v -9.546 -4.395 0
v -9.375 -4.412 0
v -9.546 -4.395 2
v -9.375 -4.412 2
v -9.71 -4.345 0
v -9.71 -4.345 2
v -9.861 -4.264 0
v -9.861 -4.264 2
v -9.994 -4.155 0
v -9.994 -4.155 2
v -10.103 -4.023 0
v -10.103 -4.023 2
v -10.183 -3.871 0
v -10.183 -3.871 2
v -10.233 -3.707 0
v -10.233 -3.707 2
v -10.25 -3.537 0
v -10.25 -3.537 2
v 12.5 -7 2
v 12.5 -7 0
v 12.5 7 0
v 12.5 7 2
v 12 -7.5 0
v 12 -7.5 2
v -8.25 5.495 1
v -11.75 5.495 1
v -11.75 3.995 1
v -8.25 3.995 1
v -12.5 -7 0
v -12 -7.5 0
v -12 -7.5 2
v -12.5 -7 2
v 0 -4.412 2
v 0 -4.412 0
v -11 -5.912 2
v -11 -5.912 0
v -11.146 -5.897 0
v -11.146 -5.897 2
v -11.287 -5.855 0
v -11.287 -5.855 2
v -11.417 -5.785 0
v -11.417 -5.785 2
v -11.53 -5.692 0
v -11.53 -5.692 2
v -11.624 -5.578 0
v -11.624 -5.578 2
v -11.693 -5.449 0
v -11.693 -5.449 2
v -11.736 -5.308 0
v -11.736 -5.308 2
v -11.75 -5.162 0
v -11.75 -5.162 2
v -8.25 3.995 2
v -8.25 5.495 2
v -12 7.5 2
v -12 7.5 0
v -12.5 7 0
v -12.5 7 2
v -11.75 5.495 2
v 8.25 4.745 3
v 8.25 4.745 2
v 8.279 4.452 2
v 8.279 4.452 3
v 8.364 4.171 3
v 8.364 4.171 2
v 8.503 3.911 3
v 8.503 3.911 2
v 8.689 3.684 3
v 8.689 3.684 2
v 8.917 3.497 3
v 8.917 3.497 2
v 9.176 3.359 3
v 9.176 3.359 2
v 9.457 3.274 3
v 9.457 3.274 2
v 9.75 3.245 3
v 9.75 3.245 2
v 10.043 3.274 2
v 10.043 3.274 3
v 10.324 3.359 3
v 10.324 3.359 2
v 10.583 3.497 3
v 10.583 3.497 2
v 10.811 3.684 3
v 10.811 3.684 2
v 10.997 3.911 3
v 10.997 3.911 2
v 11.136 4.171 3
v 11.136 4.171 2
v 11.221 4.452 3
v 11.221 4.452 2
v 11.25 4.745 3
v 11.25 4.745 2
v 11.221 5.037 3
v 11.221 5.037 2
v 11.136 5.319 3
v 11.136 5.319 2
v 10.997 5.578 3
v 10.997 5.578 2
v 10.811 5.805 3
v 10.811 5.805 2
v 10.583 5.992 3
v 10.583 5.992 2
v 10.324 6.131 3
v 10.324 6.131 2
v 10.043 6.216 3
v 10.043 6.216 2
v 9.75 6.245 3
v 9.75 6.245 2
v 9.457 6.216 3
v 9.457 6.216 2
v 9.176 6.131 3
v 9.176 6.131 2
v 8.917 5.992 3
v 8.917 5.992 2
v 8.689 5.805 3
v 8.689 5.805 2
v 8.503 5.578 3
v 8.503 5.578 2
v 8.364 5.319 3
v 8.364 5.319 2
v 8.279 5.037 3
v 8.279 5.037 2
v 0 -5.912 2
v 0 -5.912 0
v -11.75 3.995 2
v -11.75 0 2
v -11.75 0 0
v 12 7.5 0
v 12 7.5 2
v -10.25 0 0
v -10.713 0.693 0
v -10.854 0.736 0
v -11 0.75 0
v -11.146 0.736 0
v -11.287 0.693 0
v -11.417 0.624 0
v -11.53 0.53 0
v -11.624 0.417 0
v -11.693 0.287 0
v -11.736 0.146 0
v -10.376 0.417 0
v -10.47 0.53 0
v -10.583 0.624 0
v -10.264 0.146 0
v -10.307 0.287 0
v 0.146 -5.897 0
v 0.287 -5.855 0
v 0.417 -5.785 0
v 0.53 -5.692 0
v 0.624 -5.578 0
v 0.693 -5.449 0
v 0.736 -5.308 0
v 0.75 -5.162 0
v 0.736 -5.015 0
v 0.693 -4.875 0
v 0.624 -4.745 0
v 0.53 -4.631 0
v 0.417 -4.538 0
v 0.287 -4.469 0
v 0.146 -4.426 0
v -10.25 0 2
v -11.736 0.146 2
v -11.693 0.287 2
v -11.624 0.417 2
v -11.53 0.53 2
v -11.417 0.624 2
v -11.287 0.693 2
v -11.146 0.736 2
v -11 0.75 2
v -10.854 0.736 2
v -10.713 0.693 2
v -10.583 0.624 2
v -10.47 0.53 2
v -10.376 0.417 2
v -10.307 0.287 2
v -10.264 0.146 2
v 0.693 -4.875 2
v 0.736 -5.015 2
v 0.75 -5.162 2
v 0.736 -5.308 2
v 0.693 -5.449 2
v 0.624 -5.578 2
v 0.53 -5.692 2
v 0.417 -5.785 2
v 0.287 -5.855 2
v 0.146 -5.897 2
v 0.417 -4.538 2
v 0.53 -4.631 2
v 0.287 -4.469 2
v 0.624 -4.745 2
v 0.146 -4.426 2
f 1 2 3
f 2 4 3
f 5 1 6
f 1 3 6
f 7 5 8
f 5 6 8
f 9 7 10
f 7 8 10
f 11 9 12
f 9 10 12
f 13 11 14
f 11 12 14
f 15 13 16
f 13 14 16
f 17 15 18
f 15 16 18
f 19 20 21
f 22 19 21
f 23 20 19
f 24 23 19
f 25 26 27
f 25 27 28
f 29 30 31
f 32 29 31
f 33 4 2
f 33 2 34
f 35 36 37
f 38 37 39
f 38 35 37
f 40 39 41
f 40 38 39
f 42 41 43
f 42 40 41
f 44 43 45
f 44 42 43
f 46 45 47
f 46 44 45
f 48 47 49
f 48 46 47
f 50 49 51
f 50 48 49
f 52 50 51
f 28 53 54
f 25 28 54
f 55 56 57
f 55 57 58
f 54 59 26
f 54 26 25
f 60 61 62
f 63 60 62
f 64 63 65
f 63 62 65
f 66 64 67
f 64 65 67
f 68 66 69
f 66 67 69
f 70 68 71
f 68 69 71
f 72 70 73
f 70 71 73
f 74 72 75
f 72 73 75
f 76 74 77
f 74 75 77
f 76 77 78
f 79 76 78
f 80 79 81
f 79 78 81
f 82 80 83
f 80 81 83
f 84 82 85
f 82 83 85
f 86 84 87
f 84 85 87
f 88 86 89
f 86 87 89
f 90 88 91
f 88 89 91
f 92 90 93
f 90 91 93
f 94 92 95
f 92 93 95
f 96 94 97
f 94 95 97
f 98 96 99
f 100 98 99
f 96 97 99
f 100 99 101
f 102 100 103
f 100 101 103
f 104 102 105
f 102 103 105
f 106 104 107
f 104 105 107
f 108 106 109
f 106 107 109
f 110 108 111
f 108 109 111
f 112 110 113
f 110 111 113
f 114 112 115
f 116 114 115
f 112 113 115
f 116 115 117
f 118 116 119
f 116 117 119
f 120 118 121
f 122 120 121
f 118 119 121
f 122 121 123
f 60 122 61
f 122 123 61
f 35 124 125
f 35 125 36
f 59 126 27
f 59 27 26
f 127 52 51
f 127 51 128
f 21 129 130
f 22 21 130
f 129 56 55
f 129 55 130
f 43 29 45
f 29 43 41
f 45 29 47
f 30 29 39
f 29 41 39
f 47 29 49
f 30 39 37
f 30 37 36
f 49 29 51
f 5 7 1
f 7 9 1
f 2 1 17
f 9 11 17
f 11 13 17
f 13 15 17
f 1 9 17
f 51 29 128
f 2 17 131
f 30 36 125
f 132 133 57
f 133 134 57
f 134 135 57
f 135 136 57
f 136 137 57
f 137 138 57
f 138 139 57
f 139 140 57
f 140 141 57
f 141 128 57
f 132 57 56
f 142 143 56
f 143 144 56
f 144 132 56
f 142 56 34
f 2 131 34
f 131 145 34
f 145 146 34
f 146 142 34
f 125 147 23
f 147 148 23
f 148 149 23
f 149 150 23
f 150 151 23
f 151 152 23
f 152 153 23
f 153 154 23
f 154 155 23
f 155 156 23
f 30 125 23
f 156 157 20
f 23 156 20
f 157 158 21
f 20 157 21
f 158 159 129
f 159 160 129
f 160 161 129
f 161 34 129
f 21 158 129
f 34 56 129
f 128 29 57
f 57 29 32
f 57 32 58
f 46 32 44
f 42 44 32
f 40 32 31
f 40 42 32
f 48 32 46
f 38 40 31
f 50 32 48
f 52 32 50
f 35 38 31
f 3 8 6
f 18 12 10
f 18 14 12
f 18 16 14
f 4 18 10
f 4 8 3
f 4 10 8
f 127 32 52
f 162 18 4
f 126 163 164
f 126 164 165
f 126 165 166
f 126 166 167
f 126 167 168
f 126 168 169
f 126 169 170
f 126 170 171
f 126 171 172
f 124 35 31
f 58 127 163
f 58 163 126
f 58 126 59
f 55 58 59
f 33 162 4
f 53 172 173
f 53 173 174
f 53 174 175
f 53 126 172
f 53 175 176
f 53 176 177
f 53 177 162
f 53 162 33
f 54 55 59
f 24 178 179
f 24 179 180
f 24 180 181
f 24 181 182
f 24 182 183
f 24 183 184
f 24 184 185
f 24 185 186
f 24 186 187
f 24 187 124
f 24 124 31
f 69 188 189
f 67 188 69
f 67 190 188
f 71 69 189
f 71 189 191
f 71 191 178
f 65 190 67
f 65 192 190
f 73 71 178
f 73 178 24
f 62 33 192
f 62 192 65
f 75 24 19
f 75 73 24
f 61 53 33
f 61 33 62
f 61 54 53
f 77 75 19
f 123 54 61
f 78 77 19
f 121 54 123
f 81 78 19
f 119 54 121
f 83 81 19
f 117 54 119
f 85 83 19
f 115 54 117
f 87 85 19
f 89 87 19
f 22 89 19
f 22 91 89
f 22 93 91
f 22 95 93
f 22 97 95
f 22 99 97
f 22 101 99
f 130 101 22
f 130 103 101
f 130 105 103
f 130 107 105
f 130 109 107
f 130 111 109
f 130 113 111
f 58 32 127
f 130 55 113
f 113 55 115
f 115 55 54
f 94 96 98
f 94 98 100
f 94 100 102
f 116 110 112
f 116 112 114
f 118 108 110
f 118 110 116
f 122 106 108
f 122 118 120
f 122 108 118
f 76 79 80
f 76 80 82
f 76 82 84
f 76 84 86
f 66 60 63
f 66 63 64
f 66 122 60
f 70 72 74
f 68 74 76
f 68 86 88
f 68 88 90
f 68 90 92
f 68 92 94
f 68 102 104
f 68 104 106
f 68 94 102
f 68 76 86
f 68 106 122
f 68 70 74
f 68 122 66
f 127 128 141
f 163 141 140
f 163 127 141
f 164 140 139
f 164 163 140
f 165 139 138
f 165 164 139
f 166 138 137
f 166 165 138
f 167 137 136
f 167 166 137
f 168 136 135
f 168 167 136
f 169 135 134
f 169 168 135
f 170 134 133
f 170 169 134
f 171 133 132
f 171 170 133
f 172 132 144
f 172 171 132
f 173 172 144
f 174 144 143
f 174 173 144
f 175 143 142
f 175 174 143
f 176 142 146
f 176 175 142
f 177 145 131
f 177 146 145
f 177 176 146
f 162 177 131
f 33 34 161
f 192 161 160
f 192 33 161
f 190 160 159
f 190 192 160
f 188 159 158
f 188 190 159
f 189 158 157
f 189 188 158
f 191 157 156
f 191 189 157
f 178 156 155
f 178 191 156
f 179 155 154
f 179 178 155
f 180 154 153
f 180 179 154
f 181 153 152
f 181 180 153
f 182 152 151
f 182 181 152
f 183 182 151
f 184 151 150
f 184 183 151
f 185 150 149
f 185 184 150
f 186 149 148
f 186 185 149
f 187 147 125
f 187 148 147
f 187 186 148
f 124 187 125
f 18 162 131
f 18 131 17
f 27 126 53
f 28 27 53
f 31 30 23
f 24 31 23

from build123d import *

# Parameters (mm, degrees)
SKETCH1_W           = 25
SKETCH1_H           = 15
BOSS_EXTRUDE1_DEPTH = 2
CHAMFER1_SIZE       = 0.5
SKETCH2_R           = 1.5
BOSS_EXTRUDE2_DEPTH = 1
SKETCH3_W           = 3.5
SKETCH3_H           = 1.5
CUT_EXTRUDE1_DEPTH  = 1
CUT_EXTRUDE2_REACH  = 16.714
CUT_EXTRUDE3_REACH  = 16.714
FILLET2_R           = 0.875


with BuildPart() as part:
    # Sketch1 → Boss-Extrude1 (new body)
    with BuildSketch(Plane.XY):
        Rectangle(SKETCH1_W, SKETCH1_H)
    extrude(amount=BOSS_EXTRUDE1_DEPTH)

    # Chamfer1
    chamfer1_edges = [part.edges().sort_by_distance(p)[0] for p in [
        (-12.5, -7.5, 1),
        (12.5, -7.5, 1),
        (12.5, 7.5, 1),
        (-12.5, 7.5, 1),
    ]]
    chamfer(chamfer1_edges, length=CHAMFER1_SIZE)

    # Sketch2 → Boss-Extrude2 (add)
    with BuildSketch(Plane.XY.offset(2)):
        with Locations(Location((9.75, 4.7447, 0), (0, 0, 180))):
            Circle(SKETCH2_R)
    extrude(amount=BOSS_EXTRUDE2_DEPTH)

    # Sketch3 → Cut-Extrude1 (cut)
    with BuildSketch(Plane.XY.offset(2)):
        with Locations((-10, 4.7447)):
            Rectangle(SKETCH3_W, SKETCH3_H)
    extrude(amount=-CUT_EXTRUDE1_DEPTH, mode=Mode.SUBTRACT)

    # Sketch4 → Cut-Extrude2 (cut, up to next)
    with BuildSketch(Plane.XY.offset(2), mode=Mode.PRIVATE) as cut_extrude2_sk1:
        with BuildLine():
            Line((-11, -4.411618673), (0, -4.411618673))
            ThreePointArc((0, -4.411618673), (0.75, -5.161618673), (0, -5.911618673))
            Line((0, -5.911618673), (-11, -5.911618673))
            ThreePointArc((-11, -5.911618673), (-11.75, -5.161618673), (-11, -4.411618673))
        make_face()
    cut_extrude2_tool1 = extrude(cut_extrude2_sk1.sketch, amount=-CUT_EXTRUDE2_REACH, mode=Mode.PRIVATE) & part.part
    add(cut_extrude2_tool1.solids().sort_by_distance((-5.5, -5.161619, 2))[0], mode=Mode.SUBTRACT)

    # Sketch4<4> → Cut-Extrude3 (cut, up to next)
    with BuildSketch(Plane.XY.offset(2), mode=Mode.PRIVATE) as cut_extrude3_sk1:
        with BuildLine():
            Line((-11.75, -5.161618673), (-11.75, 0))
            ThreePointArc((-11.75, 0), (-11, 0.75), (-10.25, 0))
            Line((-10.25, 0), (-10.25, -5.161618673))
            ThreePointArc((-10.25, -5.161618673), (-11, -5.911618673), (-11.75, -5.161618673))
        make_face()
    cut_extrude3_tool1 = extrude(cut_extrude3_sk1.sketch, amount=-CUT_EXTRUDE3_REACH, mode=Mode.PRIVATE) & part.part
    add(cut_extrude3_tool1.solids().sort_by_distance((-11, -2.580809, 2))[0], mode=Mode.SUBTRACT)

    # Fillet2
    fillet2_edges = [part.edges().sort_by_distance(p)[0] for p in [
        (-10.25, -4.411618673, 1),
    ]]
    fillet(fillet2_edges, radius=FILLET2_R)


solid = part.part
